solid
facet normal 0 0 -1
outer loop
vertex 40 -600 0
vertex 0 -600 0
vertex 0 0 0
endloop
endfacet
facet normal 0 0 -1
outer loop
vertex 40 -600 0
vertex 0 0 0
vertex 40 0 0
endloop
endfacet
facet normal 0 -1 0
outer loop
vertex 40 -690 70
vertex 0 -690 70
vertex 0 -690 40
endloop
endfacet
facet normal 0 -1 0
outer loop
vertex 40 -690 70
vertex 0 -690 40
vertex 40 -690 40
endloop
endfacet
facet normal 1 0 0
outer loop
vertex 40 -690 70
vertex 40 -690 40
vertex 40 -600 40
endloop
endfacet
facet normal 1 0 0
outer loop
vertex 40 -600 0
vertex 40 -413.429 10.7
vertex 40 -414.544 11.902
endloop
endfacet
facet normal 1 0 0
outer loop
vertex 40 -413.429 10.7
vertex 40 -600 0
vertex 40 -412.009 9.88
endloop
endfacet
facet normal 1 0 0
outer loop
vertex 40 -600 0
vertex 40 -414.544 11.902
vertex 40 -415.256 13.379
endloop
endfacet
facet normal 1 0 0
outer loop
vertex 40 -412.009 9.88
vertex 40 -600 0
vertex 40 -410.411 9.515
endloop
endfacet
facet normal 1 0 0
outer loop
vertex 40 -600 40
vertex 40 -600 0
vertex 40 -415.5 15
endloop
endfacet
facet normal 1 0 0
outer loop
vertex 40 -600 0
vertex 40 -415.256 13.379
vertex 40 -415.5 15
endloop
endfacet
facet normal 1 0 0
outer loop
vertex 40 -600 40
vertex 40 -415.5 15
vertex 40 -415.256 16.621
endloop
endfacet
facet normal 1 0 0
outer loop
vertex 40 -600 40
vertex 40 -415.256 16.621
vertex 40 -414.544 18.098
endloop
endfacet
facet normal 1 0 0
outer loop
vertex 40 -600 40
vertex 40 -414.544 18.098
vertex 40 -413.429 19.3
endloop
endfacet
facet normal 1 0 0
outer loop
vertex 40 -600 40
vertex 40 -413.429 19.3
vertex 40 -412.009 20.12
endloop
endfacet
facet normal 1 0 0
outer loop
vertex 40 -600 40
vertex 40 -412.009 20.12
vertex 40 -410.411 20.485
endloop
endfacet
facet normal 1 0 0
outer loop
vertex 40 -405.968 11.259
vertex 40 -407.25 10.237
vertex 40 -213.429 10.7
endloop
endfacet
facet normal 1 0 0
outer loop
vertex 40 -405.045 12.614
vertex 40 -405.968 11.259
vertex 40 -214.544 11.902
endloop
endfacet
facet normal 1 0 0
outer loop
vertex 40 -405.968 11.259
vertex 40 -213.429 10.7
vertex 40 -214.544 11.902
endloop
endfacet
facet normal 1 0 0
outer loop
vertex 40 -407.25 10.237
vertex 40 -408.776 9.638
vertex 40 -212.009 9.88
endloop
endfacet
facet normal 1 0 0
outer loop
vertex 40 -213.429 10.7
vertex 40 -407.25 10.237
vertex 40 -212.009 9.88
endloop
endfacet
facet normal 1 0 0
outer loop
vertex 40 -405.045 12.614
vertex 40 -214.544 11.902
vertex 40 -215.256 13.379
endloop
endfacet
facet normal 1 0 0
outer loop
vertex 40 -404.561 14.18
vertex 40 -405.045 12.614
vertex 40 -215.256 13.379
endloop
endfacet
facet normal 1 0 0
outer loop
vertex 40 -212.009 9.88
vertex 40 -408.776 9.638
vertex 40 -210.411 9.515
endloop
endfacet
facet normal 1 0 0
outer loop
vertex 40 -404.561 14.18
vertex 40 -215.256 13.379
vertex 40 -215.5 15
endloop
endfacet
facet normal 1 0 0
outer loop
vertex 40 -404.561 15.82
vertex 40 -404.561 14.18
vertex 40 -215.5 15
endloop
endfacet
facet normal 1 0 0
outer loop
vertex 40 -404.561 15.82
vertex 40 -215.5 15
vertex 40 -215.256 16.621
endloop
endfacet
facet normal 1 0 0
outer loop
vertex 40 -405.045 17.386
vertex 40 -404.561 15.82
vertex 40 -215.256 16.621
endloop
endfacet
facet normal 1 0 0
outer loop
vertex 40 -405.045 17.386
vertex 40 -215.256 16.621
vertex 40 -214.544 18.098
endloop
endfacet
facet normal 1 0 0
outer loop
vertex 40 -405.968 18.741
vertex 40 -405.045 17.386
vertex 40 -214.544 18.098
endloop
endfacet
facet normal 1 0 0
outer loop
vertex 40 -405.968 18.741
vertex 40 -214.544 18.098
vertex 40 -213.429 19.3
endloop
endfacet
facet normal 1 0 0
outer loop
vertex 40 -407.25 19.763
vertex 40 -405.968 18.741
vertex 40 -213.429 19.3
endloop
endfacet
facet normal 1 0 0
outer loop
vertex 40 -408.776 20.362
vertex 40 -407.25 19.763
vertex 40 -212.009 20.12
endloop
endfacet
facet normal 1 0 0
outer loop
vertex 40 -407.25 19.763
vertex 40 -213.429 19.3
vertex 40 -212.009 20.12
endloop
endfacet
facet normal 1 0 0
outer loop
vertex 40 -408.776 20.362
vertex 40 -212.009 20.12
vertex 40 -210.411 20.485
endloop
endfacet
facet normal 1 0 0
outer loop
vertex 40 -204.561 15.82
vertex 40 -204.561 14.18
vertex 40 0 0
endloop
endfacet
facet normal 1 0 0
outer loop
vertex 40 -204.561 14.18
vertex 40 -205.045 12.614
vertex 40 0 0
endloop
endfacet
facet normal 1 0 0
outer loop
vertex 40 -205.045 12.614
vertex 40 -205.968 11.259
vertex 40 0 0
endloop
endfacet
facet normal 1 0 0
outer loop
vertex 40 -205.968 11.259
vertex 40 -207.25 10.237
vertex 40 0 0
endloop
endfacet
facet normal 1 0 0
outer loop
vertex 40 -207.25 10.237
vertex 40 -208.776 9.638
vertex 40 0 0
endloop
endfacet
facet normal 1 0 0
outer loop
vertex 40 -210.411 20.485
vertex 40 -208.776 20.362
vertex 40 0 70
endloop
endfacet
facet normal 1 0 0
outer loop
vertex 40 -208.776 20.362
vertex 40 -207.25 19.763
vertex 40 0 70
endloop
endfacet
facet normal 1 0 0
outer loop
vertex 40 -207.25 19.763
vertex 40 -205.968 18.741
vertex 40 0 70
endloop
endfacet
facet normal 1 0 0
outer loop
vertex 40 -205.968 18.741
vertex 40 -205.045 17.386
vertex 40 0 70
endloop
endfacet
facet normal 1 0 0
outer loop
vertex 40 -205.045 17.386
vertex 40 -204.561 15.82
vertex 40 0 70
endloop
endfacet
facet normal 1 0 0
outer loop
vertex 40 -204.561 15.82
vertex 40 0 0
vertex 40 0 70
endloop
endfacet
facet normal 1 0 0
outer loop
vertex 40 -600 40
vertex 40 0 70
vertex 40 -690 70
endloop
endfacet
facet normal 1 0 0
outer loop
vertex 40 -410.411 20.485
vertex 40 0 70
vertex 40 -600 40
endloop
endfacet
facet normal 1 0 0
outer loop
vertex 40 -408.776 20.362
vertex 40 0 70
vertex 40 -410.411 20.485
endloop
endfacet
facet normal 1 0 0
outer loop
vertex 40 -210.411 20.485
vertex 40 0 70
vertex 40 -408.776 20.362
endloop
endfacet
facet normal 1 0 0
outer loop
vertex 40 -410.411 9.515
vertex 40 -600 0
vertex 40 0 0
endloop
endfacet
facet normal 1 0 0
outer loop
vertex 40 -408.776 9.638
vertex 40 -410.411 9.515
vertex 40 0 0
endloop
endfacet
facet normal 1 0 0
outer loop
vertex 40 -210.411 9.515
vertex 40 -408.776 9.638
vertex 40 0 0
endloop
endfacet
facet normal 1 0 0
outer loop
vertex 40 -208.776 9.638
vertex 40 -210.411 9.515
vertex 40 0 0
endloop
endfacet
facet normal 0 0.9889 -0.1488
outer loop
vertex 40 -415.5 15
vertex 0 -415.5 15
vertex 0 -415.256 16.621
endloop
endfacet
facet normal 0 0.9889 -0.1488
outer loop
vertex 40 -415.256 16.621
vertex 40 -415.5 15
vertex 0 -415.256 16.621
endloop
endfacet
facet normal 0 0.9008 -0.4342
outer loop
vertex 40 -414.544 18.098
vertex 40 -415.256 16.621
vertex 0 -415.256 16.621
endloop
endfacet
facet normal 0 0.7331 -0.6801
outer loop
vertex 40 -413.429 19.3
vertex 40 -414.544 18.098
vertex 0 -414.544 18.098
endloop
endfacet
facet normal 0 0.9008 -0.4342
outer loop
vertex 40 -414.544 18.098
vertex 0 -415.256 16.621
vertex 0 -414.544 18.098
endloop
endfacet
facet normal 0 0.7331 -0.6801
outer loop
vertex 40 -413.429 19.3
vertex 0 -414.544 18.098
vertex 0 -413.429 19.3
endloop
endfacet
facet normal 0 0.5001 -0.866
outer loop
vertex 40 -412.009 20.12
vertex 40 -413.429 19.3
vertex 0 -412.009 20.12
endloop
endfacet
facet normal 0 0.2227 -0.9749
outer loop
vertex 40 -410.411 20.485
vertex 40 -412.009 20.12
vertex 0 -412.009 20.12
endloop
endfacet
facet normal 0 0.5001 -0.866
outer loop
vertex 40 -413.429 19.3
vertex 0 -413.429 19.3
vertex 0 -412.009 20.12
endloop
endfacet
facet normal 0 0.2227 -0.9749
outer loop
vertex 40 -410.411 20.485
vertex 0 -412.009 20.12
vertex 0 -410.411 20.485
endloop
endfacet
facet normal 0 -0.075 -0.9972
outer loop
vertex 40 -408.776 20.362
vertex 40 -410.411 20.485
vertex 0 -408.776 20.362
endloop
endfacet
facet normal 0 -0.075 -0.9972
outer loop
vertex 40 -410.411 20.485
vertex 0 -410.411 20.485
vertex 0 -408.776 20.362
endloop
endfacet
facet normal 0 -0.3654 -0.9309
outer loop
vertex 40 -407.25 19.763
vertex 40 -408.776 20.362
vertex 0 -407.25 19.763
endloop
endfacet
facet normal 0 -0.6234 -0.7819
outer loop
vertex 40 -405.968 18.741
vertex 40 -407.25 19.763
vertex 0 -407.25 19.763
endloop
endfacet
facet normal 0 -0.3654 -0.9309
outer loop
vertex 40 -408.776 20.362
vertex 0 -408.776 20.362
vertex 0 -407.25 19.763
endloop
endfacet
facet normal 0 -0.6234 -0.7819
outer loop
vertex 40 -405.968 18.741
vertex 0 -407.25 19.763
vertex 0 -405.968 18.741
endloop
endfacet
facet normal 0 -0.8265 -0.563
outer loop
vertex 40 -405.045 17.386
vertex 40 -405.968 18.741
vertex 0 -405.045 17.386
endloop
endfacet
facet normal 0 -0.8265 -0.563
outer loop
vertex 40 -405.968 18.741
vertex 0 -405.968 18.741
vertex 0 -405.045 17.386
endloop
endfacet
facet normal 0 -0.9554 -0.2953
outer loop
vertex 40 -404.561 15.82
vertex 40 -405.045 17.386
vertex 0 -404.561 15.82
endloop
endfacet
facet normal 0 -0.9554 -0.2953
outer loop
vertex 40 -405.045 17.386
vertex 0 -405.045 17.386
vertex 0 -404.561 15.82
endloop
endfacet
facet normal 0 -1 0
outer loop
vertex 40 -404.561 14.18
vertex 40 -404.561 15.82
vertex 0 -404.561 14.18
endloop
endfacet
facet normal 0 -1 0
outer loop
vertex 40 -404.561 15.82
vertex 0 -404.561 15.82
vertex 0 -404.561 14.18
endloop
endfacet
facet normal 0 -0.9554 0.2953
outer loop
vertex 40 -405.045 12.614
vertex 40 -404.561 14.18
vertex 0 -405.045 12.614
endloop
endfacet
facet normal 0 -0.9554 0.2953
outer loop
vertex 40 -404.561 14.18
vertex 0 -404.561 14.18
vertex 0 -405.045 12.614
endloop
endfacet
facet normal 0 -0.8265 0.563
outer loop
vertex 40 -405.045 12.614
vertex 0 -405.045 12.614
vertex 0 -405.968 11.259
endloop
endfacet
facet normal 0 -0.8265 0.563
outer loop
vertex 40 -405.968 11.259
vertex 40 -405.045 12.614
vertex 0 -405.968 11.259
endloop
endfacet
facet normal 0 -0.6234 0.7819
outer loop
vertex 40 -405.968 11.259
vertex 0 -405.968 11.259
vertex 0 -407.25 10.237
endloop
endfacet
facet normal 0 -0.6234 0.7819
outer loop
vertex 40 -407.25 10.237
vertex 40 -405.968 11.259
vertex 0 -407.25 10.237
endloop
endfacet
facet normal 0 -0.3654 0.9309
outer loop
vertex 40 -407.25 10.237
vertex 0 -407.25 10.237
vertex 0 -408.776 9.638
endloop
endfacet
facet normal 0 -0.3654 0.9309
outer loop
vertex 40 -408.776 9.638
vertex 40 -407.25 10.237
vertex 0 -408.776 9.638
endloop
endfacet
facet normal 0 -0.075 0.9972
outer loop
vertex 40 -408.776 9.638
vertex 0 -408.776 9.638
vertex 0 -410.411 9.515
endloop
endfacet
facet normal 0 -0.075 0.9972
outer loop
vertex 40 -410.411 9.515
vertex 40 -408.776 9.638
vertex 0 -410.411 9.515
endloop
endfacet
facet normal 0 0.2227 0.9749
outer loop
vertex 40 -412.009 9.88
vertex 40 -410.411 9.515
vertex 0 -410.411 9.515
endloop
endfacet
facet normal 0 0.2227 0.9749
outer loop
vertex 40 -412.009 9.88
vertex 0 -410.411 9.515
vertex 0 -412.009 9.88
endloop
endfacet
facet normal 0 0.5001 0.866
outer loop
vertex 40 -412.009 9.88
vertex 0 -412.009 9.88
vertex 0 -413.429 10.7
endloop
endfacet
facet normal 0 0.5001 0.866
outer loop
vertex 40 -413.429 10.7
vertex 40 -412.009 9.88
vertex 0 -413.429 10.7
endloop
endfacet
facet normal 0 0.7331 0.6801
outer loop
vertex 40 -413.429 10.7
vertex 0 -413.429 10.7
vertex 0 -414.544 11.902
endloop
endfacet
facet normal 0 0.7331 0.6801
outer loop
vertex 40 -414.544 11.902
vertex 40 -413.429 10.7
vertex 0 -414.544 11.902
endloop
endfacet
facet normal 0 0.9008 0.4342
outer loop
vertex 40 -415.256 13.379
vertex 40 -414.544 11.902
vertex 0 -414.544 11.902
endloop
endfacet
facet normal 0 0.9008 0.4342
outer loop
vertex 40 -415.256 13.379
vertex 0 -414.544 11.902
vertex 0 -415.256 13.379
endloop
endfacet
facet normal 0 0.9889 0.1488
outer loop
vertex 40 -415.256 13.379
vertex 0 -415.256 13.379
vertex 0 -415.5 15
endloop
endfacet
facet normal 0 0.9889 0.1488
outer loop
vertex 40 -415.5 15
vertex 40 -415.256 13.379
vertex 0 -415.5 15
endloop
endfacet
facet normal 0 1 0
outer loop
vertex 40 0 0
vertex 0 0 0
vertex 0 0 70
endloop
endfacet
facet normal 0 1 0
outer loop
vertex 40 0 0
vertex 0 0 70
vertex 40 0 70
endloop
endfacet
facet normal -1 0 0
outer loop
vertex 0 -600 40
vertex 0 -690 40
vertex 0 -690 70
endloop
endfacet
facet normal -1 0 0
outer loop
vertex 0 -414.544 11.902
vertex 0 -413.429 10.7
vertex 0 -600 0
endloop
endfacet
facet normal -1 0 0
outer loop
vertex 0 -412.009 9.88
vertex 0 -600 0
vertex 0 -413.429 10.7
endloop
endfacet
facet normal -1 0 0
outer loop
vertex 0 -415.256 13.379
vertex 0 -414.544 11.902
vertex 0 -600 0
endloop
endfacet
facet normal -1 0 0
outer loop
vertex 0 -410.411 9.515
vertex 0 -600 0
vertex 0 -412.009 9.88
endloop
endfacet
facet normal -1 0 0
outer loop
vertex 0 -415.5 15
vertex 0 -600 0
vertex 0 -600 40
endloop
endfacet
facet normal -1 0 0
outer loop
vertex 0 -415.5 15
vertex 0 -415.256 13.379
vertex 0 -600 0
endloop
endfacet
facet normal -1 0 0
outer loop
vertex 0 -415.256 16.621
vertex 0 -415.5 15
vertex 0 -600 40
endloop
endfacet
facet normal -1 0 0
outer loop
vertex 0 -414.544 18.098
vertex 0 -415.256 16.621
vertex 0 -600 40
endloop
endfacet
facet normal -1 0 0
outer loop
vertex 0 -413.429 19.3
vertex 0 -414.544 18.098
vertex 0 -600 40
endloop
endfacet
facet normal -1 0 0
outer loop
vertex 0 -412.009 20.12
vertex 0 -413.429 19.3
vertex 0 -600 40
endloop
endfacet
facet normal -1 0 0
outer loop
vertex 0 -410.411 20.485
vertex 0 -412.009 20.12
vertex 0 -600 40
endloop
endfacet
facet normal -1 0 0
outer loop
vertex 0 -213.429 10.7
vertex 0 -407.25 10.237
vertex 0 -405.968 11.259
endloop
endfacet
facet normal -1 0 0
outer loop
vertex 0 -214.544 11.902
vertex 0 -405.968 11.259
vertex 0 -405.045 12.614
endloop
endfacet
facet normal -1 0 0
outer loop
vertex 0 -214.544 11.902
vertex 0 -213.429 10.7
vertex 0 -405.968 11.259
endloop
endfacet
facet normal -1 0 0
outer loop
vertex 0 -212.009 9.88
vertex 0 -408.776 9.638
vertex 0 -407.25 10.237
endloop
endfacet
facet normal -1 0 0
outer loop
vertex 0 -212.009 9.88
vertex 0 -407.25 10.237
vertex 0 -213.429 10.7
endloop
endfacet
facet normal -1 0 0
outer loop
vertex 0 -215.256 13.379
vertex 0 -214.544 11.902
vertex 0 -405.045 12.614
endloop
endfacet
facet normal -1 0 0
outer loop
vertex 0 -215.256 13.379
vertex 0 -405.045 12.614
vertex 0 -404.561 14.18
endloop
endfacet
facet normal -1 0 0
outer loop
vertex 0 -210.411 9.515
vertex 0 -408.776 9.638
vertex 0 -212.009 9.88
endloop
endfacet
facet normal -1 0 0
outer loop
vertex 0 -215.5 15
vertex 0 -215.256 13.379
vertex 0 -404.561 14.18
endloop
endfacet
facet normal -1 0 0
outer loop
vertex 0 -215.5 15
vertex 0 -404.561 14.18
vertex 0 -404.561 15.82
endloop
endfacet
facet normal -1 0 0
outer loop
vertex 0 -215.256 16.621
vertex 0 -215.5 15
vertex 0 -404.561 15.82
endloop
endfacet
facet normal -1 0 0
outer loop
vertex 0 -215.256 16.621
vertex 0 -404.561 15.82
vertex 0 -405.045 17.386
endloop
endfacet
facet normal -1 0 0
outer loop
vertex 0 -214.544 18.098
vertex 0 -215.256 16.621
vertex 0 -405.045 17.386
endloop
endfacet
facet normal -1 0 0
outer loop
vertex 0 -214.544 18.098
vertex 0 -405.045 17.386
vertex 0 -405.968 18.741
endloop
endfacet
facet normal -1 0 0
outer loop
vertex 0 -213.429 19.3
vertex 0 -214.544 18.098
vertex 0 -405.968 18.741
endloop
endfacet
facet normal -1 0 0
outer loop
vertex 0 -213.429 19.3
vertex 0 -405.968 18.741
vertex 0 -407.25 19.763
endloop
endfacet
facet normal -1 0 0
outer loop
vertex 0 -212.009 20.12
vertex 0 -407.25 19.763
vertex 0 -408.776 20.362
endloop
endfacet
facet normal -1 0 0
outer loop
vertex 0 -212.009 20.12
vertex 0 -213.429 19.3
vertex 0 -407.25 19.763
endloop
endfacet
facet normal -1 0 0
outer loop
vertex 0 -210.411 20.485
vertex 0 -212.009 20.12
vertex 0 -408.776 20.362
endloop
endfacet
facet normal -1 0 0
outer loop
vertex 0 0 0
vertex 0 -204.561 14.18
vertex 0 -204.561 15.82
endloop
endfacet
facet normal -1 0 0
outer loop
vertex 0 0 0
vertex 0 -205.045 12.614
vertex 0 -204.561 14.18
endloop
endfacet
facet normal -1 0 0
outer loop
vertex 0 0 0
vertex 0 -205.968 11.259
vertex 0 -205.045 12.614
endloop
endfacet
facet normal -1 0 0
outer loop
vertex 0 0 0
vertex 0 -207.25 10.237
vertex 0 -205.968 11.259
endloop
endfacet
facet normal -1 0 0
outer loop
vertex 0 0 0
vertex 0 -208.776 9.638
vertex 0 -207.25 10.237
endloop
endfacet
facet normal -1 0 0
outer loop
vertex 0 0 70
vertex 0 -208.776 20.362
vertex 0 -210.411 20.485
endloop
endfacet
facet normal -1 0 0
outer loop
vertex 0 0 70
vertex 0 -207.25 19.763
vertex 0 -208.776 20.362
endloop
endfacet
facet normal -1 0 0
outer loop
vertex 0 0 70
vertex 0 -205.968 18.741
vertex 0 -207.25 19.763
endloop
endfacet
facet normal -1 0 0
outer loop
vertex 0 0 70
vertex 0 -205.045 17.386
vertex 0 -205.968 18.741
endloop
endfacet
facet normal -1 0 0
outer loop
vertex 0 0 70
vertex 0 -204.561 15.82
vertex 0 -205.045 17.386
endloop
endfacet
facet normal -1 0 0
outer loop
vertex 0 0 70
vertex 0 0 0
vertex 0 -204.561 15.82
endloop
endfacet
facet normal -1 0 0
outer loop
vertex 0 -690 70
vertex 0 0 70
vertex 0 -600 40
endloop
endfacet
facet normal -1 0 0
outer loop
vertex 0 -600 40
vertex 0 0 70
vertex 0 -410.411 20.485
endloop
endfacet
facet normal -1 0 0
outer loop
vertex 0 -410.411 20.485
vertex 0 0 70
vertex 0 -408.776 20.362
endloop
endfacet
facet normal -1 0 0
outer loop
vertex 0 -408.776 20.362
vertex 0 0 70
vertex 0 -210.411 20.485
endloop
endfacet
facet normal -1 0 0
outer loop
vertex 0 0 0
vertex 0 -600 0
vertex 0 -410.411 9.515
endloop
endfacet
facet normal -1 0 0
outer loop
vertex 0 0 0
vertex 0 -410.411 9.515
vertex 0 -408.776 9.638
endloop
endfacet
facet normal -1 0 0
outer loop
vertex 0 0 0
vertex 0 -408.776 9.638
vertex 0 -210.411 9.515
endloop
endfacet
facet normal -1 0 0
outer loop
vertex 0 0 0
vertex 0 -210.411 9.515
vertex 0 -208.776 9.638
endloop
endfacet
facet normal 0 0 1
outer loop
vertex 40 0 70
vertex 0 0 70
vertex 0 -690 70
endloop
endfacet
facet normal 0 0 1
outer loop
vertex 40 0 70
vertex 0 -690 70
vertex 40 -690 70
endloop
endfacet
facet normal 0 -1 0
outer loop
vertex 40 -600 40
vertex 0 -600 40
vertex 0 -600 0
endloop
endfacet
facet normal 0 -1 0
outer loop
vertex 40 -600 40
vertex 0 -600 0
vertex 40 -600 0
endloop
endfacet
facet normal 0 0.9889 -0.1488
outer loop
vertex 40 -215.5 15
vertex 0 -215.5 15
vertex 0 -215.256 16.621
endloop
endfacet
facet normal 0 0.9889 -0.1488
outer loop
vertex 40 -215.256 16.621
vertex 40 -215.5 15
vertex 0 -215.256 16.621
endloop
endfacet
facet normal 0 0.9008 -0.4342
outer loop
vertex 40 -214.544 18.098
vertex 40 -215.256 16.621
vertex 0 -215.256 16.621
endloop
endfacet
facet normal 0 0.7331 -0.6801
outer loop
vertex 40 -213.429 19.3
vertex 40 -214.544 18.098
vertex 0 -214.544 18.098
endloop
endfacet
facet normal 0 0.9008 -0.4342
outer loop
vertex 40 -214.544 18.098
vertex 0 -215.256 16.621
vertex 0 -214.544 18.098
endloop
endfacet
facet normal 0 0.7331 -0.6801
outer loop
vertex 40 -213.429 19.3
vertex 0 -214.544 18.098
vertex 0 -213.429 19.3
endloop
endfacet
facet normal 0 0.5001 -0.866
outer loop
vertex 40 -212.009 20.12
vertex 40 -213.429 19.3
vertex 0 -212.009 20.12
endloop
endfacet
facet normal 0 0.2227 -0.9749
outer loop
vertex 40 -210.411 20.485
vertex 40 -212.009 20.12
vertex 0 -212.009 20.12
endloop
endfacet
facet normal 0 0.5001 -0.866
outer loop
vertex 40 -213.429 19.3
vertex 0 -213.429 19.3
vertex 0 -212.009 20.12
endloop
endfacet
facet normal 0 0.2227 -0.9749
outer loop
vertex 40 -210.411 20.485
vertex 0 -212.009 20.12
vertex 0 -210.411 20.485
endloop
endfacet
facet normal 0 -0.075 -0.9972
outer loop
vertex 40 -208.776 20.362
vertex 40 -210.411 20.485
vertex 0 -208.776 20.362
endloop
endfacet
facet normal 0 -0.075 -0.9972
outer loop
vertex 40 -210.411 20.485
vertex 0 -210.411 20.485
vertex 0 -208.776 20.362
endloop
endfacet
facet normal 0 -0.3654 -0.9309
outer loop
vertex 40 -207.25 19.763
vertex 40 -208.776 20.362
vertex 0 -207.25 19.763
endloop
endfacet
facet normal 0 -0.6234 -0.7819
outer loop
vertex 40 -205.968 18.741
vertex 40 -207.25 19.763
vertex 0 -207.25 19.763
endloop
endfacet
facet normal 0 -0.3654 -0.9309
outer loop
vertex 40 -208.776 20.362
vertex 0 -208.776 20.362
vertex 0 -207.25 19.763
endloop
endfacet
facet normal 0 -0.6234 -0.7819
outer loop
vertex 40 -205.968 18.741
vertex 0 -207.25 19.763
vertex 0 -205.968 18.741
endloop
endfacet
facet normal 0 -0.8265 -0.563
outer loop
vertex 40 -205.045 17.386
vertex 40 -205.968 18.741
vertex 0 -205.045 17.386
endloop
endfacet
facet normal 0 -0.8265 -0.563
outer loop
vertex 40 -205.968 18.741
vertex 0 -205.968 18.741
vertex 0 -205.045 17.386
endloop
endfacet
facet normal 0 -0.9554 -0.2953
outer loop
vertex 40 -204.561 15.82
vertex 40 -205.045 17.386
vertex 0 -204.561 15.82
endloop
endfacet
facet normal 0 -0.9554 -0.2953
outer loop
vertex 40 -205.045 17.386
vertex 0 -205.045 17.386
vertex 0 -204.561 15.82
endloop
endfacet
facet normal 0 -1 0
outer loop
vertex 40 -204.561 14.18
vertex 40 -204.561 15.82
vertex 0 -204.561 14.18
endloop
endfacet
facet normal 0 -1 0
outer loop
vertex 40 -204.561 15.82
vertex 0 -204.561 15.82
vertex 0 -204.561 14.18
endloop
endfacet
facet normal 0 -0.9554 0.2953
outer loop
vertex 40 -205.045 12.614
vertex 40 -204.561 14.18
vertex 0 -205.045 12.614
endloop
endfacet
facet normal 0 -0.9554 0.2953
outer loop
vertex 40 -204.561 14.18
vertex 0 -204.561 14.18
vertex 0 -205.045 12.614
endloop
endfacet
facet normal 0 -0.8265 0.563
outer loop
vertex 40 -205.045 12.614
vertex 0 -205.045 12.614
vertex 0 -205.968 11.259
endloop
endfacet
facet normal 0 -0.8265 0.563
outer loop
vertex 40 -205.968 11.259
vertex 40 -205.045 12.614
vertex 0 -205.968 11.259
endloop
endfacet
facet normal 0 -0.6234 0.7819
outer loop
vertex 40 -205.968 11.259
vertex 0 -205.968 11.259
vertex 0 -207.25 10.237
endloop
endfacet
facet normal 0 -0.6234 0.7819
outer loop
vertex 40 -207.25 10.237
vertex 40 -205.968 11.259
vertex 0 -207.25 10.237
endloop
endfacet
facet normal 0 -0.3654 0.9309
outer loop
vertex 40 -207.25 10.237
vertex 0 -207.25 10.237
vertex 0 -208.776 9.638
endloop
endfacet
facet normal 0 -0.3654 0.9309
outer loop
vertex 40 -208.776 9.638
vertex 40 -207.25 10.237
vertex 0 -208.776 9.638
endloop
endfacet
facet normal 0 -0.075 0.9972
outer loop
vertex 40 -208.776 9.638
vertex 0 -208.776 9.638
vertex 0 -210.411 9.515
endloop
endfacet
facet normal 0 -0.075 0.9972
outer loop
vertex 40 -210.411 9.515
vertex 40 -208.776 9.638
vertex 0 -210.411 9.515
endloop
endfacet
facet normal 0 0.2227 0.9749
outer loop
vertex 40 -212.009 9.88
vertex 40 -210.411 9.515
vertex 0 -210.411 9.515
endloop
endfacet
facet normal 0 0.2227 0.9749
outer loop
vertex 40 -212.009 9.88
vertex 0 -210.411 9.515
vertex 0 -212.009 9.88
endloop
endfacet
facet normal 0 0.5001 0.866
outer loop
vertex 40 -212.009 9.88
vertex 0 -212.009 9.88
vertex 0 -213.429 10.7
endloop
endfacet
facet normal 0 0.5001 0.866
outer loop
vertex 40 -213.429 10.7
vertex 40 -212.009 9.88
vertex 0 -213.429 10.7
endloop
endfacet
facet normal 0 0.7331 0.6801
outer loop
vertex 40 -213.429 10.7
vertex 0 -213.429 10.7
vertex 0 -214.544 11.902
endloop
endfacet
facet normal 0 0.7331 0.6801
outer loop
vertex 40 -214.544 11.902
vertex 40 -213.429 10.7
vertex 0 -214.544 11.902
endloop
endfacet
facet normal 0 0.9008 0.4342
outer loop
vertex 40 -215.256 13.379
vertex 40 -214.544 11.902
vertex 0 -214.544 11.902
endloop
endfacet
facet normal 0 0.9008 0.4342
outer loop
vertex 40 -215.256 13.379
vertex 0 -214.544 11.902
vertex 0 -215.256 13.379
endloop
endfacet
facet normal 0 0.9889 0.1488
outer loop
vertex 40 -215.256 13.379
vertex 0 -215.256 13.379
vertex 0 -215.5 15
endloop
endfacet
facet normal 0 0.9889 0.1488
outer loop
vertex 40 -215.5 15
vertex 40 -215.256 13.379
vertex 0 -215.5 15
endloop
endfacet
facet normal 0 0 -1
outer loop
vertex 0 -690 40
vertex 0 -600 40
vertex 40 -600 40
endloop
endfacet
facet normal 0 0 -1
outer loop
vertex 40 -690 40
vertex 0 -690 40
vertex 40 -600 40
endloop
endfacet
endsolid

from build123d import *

# Parameters (mm, degrees)
F0_W     = 40
F0_H     = 70
F1_DEPTH = 600
F3_D     = 11
F3_DEPTH = 50
F4_W     = 40
F4_H     = 30
F5_DEPTH = 90


with BuildPart() as f1:
    # F0 (on Front) → F1 (new body)
    with BuildSketch(Plane.XZ):
        with Locations((20, 35)):
            Rectangle(F0_W, F0_H)
    extrude(amount=F1_DEPTH)

    # F3
    with Locations(Plane.YZ.offset(40)):
        with Locations((-410, 15), (-210, 15)):
            Hole(F3_D / 2, depth=F3_DEPTH)

    # F4 (on face) → F5 (join)
    with BuildSketch(Plane.XZ.offset(600)):
        with Locations((20, 55)):
            Rectangle(F4_W, F4_H)
    extrude(amount=F5_DEPTH)


solid = f1.part
